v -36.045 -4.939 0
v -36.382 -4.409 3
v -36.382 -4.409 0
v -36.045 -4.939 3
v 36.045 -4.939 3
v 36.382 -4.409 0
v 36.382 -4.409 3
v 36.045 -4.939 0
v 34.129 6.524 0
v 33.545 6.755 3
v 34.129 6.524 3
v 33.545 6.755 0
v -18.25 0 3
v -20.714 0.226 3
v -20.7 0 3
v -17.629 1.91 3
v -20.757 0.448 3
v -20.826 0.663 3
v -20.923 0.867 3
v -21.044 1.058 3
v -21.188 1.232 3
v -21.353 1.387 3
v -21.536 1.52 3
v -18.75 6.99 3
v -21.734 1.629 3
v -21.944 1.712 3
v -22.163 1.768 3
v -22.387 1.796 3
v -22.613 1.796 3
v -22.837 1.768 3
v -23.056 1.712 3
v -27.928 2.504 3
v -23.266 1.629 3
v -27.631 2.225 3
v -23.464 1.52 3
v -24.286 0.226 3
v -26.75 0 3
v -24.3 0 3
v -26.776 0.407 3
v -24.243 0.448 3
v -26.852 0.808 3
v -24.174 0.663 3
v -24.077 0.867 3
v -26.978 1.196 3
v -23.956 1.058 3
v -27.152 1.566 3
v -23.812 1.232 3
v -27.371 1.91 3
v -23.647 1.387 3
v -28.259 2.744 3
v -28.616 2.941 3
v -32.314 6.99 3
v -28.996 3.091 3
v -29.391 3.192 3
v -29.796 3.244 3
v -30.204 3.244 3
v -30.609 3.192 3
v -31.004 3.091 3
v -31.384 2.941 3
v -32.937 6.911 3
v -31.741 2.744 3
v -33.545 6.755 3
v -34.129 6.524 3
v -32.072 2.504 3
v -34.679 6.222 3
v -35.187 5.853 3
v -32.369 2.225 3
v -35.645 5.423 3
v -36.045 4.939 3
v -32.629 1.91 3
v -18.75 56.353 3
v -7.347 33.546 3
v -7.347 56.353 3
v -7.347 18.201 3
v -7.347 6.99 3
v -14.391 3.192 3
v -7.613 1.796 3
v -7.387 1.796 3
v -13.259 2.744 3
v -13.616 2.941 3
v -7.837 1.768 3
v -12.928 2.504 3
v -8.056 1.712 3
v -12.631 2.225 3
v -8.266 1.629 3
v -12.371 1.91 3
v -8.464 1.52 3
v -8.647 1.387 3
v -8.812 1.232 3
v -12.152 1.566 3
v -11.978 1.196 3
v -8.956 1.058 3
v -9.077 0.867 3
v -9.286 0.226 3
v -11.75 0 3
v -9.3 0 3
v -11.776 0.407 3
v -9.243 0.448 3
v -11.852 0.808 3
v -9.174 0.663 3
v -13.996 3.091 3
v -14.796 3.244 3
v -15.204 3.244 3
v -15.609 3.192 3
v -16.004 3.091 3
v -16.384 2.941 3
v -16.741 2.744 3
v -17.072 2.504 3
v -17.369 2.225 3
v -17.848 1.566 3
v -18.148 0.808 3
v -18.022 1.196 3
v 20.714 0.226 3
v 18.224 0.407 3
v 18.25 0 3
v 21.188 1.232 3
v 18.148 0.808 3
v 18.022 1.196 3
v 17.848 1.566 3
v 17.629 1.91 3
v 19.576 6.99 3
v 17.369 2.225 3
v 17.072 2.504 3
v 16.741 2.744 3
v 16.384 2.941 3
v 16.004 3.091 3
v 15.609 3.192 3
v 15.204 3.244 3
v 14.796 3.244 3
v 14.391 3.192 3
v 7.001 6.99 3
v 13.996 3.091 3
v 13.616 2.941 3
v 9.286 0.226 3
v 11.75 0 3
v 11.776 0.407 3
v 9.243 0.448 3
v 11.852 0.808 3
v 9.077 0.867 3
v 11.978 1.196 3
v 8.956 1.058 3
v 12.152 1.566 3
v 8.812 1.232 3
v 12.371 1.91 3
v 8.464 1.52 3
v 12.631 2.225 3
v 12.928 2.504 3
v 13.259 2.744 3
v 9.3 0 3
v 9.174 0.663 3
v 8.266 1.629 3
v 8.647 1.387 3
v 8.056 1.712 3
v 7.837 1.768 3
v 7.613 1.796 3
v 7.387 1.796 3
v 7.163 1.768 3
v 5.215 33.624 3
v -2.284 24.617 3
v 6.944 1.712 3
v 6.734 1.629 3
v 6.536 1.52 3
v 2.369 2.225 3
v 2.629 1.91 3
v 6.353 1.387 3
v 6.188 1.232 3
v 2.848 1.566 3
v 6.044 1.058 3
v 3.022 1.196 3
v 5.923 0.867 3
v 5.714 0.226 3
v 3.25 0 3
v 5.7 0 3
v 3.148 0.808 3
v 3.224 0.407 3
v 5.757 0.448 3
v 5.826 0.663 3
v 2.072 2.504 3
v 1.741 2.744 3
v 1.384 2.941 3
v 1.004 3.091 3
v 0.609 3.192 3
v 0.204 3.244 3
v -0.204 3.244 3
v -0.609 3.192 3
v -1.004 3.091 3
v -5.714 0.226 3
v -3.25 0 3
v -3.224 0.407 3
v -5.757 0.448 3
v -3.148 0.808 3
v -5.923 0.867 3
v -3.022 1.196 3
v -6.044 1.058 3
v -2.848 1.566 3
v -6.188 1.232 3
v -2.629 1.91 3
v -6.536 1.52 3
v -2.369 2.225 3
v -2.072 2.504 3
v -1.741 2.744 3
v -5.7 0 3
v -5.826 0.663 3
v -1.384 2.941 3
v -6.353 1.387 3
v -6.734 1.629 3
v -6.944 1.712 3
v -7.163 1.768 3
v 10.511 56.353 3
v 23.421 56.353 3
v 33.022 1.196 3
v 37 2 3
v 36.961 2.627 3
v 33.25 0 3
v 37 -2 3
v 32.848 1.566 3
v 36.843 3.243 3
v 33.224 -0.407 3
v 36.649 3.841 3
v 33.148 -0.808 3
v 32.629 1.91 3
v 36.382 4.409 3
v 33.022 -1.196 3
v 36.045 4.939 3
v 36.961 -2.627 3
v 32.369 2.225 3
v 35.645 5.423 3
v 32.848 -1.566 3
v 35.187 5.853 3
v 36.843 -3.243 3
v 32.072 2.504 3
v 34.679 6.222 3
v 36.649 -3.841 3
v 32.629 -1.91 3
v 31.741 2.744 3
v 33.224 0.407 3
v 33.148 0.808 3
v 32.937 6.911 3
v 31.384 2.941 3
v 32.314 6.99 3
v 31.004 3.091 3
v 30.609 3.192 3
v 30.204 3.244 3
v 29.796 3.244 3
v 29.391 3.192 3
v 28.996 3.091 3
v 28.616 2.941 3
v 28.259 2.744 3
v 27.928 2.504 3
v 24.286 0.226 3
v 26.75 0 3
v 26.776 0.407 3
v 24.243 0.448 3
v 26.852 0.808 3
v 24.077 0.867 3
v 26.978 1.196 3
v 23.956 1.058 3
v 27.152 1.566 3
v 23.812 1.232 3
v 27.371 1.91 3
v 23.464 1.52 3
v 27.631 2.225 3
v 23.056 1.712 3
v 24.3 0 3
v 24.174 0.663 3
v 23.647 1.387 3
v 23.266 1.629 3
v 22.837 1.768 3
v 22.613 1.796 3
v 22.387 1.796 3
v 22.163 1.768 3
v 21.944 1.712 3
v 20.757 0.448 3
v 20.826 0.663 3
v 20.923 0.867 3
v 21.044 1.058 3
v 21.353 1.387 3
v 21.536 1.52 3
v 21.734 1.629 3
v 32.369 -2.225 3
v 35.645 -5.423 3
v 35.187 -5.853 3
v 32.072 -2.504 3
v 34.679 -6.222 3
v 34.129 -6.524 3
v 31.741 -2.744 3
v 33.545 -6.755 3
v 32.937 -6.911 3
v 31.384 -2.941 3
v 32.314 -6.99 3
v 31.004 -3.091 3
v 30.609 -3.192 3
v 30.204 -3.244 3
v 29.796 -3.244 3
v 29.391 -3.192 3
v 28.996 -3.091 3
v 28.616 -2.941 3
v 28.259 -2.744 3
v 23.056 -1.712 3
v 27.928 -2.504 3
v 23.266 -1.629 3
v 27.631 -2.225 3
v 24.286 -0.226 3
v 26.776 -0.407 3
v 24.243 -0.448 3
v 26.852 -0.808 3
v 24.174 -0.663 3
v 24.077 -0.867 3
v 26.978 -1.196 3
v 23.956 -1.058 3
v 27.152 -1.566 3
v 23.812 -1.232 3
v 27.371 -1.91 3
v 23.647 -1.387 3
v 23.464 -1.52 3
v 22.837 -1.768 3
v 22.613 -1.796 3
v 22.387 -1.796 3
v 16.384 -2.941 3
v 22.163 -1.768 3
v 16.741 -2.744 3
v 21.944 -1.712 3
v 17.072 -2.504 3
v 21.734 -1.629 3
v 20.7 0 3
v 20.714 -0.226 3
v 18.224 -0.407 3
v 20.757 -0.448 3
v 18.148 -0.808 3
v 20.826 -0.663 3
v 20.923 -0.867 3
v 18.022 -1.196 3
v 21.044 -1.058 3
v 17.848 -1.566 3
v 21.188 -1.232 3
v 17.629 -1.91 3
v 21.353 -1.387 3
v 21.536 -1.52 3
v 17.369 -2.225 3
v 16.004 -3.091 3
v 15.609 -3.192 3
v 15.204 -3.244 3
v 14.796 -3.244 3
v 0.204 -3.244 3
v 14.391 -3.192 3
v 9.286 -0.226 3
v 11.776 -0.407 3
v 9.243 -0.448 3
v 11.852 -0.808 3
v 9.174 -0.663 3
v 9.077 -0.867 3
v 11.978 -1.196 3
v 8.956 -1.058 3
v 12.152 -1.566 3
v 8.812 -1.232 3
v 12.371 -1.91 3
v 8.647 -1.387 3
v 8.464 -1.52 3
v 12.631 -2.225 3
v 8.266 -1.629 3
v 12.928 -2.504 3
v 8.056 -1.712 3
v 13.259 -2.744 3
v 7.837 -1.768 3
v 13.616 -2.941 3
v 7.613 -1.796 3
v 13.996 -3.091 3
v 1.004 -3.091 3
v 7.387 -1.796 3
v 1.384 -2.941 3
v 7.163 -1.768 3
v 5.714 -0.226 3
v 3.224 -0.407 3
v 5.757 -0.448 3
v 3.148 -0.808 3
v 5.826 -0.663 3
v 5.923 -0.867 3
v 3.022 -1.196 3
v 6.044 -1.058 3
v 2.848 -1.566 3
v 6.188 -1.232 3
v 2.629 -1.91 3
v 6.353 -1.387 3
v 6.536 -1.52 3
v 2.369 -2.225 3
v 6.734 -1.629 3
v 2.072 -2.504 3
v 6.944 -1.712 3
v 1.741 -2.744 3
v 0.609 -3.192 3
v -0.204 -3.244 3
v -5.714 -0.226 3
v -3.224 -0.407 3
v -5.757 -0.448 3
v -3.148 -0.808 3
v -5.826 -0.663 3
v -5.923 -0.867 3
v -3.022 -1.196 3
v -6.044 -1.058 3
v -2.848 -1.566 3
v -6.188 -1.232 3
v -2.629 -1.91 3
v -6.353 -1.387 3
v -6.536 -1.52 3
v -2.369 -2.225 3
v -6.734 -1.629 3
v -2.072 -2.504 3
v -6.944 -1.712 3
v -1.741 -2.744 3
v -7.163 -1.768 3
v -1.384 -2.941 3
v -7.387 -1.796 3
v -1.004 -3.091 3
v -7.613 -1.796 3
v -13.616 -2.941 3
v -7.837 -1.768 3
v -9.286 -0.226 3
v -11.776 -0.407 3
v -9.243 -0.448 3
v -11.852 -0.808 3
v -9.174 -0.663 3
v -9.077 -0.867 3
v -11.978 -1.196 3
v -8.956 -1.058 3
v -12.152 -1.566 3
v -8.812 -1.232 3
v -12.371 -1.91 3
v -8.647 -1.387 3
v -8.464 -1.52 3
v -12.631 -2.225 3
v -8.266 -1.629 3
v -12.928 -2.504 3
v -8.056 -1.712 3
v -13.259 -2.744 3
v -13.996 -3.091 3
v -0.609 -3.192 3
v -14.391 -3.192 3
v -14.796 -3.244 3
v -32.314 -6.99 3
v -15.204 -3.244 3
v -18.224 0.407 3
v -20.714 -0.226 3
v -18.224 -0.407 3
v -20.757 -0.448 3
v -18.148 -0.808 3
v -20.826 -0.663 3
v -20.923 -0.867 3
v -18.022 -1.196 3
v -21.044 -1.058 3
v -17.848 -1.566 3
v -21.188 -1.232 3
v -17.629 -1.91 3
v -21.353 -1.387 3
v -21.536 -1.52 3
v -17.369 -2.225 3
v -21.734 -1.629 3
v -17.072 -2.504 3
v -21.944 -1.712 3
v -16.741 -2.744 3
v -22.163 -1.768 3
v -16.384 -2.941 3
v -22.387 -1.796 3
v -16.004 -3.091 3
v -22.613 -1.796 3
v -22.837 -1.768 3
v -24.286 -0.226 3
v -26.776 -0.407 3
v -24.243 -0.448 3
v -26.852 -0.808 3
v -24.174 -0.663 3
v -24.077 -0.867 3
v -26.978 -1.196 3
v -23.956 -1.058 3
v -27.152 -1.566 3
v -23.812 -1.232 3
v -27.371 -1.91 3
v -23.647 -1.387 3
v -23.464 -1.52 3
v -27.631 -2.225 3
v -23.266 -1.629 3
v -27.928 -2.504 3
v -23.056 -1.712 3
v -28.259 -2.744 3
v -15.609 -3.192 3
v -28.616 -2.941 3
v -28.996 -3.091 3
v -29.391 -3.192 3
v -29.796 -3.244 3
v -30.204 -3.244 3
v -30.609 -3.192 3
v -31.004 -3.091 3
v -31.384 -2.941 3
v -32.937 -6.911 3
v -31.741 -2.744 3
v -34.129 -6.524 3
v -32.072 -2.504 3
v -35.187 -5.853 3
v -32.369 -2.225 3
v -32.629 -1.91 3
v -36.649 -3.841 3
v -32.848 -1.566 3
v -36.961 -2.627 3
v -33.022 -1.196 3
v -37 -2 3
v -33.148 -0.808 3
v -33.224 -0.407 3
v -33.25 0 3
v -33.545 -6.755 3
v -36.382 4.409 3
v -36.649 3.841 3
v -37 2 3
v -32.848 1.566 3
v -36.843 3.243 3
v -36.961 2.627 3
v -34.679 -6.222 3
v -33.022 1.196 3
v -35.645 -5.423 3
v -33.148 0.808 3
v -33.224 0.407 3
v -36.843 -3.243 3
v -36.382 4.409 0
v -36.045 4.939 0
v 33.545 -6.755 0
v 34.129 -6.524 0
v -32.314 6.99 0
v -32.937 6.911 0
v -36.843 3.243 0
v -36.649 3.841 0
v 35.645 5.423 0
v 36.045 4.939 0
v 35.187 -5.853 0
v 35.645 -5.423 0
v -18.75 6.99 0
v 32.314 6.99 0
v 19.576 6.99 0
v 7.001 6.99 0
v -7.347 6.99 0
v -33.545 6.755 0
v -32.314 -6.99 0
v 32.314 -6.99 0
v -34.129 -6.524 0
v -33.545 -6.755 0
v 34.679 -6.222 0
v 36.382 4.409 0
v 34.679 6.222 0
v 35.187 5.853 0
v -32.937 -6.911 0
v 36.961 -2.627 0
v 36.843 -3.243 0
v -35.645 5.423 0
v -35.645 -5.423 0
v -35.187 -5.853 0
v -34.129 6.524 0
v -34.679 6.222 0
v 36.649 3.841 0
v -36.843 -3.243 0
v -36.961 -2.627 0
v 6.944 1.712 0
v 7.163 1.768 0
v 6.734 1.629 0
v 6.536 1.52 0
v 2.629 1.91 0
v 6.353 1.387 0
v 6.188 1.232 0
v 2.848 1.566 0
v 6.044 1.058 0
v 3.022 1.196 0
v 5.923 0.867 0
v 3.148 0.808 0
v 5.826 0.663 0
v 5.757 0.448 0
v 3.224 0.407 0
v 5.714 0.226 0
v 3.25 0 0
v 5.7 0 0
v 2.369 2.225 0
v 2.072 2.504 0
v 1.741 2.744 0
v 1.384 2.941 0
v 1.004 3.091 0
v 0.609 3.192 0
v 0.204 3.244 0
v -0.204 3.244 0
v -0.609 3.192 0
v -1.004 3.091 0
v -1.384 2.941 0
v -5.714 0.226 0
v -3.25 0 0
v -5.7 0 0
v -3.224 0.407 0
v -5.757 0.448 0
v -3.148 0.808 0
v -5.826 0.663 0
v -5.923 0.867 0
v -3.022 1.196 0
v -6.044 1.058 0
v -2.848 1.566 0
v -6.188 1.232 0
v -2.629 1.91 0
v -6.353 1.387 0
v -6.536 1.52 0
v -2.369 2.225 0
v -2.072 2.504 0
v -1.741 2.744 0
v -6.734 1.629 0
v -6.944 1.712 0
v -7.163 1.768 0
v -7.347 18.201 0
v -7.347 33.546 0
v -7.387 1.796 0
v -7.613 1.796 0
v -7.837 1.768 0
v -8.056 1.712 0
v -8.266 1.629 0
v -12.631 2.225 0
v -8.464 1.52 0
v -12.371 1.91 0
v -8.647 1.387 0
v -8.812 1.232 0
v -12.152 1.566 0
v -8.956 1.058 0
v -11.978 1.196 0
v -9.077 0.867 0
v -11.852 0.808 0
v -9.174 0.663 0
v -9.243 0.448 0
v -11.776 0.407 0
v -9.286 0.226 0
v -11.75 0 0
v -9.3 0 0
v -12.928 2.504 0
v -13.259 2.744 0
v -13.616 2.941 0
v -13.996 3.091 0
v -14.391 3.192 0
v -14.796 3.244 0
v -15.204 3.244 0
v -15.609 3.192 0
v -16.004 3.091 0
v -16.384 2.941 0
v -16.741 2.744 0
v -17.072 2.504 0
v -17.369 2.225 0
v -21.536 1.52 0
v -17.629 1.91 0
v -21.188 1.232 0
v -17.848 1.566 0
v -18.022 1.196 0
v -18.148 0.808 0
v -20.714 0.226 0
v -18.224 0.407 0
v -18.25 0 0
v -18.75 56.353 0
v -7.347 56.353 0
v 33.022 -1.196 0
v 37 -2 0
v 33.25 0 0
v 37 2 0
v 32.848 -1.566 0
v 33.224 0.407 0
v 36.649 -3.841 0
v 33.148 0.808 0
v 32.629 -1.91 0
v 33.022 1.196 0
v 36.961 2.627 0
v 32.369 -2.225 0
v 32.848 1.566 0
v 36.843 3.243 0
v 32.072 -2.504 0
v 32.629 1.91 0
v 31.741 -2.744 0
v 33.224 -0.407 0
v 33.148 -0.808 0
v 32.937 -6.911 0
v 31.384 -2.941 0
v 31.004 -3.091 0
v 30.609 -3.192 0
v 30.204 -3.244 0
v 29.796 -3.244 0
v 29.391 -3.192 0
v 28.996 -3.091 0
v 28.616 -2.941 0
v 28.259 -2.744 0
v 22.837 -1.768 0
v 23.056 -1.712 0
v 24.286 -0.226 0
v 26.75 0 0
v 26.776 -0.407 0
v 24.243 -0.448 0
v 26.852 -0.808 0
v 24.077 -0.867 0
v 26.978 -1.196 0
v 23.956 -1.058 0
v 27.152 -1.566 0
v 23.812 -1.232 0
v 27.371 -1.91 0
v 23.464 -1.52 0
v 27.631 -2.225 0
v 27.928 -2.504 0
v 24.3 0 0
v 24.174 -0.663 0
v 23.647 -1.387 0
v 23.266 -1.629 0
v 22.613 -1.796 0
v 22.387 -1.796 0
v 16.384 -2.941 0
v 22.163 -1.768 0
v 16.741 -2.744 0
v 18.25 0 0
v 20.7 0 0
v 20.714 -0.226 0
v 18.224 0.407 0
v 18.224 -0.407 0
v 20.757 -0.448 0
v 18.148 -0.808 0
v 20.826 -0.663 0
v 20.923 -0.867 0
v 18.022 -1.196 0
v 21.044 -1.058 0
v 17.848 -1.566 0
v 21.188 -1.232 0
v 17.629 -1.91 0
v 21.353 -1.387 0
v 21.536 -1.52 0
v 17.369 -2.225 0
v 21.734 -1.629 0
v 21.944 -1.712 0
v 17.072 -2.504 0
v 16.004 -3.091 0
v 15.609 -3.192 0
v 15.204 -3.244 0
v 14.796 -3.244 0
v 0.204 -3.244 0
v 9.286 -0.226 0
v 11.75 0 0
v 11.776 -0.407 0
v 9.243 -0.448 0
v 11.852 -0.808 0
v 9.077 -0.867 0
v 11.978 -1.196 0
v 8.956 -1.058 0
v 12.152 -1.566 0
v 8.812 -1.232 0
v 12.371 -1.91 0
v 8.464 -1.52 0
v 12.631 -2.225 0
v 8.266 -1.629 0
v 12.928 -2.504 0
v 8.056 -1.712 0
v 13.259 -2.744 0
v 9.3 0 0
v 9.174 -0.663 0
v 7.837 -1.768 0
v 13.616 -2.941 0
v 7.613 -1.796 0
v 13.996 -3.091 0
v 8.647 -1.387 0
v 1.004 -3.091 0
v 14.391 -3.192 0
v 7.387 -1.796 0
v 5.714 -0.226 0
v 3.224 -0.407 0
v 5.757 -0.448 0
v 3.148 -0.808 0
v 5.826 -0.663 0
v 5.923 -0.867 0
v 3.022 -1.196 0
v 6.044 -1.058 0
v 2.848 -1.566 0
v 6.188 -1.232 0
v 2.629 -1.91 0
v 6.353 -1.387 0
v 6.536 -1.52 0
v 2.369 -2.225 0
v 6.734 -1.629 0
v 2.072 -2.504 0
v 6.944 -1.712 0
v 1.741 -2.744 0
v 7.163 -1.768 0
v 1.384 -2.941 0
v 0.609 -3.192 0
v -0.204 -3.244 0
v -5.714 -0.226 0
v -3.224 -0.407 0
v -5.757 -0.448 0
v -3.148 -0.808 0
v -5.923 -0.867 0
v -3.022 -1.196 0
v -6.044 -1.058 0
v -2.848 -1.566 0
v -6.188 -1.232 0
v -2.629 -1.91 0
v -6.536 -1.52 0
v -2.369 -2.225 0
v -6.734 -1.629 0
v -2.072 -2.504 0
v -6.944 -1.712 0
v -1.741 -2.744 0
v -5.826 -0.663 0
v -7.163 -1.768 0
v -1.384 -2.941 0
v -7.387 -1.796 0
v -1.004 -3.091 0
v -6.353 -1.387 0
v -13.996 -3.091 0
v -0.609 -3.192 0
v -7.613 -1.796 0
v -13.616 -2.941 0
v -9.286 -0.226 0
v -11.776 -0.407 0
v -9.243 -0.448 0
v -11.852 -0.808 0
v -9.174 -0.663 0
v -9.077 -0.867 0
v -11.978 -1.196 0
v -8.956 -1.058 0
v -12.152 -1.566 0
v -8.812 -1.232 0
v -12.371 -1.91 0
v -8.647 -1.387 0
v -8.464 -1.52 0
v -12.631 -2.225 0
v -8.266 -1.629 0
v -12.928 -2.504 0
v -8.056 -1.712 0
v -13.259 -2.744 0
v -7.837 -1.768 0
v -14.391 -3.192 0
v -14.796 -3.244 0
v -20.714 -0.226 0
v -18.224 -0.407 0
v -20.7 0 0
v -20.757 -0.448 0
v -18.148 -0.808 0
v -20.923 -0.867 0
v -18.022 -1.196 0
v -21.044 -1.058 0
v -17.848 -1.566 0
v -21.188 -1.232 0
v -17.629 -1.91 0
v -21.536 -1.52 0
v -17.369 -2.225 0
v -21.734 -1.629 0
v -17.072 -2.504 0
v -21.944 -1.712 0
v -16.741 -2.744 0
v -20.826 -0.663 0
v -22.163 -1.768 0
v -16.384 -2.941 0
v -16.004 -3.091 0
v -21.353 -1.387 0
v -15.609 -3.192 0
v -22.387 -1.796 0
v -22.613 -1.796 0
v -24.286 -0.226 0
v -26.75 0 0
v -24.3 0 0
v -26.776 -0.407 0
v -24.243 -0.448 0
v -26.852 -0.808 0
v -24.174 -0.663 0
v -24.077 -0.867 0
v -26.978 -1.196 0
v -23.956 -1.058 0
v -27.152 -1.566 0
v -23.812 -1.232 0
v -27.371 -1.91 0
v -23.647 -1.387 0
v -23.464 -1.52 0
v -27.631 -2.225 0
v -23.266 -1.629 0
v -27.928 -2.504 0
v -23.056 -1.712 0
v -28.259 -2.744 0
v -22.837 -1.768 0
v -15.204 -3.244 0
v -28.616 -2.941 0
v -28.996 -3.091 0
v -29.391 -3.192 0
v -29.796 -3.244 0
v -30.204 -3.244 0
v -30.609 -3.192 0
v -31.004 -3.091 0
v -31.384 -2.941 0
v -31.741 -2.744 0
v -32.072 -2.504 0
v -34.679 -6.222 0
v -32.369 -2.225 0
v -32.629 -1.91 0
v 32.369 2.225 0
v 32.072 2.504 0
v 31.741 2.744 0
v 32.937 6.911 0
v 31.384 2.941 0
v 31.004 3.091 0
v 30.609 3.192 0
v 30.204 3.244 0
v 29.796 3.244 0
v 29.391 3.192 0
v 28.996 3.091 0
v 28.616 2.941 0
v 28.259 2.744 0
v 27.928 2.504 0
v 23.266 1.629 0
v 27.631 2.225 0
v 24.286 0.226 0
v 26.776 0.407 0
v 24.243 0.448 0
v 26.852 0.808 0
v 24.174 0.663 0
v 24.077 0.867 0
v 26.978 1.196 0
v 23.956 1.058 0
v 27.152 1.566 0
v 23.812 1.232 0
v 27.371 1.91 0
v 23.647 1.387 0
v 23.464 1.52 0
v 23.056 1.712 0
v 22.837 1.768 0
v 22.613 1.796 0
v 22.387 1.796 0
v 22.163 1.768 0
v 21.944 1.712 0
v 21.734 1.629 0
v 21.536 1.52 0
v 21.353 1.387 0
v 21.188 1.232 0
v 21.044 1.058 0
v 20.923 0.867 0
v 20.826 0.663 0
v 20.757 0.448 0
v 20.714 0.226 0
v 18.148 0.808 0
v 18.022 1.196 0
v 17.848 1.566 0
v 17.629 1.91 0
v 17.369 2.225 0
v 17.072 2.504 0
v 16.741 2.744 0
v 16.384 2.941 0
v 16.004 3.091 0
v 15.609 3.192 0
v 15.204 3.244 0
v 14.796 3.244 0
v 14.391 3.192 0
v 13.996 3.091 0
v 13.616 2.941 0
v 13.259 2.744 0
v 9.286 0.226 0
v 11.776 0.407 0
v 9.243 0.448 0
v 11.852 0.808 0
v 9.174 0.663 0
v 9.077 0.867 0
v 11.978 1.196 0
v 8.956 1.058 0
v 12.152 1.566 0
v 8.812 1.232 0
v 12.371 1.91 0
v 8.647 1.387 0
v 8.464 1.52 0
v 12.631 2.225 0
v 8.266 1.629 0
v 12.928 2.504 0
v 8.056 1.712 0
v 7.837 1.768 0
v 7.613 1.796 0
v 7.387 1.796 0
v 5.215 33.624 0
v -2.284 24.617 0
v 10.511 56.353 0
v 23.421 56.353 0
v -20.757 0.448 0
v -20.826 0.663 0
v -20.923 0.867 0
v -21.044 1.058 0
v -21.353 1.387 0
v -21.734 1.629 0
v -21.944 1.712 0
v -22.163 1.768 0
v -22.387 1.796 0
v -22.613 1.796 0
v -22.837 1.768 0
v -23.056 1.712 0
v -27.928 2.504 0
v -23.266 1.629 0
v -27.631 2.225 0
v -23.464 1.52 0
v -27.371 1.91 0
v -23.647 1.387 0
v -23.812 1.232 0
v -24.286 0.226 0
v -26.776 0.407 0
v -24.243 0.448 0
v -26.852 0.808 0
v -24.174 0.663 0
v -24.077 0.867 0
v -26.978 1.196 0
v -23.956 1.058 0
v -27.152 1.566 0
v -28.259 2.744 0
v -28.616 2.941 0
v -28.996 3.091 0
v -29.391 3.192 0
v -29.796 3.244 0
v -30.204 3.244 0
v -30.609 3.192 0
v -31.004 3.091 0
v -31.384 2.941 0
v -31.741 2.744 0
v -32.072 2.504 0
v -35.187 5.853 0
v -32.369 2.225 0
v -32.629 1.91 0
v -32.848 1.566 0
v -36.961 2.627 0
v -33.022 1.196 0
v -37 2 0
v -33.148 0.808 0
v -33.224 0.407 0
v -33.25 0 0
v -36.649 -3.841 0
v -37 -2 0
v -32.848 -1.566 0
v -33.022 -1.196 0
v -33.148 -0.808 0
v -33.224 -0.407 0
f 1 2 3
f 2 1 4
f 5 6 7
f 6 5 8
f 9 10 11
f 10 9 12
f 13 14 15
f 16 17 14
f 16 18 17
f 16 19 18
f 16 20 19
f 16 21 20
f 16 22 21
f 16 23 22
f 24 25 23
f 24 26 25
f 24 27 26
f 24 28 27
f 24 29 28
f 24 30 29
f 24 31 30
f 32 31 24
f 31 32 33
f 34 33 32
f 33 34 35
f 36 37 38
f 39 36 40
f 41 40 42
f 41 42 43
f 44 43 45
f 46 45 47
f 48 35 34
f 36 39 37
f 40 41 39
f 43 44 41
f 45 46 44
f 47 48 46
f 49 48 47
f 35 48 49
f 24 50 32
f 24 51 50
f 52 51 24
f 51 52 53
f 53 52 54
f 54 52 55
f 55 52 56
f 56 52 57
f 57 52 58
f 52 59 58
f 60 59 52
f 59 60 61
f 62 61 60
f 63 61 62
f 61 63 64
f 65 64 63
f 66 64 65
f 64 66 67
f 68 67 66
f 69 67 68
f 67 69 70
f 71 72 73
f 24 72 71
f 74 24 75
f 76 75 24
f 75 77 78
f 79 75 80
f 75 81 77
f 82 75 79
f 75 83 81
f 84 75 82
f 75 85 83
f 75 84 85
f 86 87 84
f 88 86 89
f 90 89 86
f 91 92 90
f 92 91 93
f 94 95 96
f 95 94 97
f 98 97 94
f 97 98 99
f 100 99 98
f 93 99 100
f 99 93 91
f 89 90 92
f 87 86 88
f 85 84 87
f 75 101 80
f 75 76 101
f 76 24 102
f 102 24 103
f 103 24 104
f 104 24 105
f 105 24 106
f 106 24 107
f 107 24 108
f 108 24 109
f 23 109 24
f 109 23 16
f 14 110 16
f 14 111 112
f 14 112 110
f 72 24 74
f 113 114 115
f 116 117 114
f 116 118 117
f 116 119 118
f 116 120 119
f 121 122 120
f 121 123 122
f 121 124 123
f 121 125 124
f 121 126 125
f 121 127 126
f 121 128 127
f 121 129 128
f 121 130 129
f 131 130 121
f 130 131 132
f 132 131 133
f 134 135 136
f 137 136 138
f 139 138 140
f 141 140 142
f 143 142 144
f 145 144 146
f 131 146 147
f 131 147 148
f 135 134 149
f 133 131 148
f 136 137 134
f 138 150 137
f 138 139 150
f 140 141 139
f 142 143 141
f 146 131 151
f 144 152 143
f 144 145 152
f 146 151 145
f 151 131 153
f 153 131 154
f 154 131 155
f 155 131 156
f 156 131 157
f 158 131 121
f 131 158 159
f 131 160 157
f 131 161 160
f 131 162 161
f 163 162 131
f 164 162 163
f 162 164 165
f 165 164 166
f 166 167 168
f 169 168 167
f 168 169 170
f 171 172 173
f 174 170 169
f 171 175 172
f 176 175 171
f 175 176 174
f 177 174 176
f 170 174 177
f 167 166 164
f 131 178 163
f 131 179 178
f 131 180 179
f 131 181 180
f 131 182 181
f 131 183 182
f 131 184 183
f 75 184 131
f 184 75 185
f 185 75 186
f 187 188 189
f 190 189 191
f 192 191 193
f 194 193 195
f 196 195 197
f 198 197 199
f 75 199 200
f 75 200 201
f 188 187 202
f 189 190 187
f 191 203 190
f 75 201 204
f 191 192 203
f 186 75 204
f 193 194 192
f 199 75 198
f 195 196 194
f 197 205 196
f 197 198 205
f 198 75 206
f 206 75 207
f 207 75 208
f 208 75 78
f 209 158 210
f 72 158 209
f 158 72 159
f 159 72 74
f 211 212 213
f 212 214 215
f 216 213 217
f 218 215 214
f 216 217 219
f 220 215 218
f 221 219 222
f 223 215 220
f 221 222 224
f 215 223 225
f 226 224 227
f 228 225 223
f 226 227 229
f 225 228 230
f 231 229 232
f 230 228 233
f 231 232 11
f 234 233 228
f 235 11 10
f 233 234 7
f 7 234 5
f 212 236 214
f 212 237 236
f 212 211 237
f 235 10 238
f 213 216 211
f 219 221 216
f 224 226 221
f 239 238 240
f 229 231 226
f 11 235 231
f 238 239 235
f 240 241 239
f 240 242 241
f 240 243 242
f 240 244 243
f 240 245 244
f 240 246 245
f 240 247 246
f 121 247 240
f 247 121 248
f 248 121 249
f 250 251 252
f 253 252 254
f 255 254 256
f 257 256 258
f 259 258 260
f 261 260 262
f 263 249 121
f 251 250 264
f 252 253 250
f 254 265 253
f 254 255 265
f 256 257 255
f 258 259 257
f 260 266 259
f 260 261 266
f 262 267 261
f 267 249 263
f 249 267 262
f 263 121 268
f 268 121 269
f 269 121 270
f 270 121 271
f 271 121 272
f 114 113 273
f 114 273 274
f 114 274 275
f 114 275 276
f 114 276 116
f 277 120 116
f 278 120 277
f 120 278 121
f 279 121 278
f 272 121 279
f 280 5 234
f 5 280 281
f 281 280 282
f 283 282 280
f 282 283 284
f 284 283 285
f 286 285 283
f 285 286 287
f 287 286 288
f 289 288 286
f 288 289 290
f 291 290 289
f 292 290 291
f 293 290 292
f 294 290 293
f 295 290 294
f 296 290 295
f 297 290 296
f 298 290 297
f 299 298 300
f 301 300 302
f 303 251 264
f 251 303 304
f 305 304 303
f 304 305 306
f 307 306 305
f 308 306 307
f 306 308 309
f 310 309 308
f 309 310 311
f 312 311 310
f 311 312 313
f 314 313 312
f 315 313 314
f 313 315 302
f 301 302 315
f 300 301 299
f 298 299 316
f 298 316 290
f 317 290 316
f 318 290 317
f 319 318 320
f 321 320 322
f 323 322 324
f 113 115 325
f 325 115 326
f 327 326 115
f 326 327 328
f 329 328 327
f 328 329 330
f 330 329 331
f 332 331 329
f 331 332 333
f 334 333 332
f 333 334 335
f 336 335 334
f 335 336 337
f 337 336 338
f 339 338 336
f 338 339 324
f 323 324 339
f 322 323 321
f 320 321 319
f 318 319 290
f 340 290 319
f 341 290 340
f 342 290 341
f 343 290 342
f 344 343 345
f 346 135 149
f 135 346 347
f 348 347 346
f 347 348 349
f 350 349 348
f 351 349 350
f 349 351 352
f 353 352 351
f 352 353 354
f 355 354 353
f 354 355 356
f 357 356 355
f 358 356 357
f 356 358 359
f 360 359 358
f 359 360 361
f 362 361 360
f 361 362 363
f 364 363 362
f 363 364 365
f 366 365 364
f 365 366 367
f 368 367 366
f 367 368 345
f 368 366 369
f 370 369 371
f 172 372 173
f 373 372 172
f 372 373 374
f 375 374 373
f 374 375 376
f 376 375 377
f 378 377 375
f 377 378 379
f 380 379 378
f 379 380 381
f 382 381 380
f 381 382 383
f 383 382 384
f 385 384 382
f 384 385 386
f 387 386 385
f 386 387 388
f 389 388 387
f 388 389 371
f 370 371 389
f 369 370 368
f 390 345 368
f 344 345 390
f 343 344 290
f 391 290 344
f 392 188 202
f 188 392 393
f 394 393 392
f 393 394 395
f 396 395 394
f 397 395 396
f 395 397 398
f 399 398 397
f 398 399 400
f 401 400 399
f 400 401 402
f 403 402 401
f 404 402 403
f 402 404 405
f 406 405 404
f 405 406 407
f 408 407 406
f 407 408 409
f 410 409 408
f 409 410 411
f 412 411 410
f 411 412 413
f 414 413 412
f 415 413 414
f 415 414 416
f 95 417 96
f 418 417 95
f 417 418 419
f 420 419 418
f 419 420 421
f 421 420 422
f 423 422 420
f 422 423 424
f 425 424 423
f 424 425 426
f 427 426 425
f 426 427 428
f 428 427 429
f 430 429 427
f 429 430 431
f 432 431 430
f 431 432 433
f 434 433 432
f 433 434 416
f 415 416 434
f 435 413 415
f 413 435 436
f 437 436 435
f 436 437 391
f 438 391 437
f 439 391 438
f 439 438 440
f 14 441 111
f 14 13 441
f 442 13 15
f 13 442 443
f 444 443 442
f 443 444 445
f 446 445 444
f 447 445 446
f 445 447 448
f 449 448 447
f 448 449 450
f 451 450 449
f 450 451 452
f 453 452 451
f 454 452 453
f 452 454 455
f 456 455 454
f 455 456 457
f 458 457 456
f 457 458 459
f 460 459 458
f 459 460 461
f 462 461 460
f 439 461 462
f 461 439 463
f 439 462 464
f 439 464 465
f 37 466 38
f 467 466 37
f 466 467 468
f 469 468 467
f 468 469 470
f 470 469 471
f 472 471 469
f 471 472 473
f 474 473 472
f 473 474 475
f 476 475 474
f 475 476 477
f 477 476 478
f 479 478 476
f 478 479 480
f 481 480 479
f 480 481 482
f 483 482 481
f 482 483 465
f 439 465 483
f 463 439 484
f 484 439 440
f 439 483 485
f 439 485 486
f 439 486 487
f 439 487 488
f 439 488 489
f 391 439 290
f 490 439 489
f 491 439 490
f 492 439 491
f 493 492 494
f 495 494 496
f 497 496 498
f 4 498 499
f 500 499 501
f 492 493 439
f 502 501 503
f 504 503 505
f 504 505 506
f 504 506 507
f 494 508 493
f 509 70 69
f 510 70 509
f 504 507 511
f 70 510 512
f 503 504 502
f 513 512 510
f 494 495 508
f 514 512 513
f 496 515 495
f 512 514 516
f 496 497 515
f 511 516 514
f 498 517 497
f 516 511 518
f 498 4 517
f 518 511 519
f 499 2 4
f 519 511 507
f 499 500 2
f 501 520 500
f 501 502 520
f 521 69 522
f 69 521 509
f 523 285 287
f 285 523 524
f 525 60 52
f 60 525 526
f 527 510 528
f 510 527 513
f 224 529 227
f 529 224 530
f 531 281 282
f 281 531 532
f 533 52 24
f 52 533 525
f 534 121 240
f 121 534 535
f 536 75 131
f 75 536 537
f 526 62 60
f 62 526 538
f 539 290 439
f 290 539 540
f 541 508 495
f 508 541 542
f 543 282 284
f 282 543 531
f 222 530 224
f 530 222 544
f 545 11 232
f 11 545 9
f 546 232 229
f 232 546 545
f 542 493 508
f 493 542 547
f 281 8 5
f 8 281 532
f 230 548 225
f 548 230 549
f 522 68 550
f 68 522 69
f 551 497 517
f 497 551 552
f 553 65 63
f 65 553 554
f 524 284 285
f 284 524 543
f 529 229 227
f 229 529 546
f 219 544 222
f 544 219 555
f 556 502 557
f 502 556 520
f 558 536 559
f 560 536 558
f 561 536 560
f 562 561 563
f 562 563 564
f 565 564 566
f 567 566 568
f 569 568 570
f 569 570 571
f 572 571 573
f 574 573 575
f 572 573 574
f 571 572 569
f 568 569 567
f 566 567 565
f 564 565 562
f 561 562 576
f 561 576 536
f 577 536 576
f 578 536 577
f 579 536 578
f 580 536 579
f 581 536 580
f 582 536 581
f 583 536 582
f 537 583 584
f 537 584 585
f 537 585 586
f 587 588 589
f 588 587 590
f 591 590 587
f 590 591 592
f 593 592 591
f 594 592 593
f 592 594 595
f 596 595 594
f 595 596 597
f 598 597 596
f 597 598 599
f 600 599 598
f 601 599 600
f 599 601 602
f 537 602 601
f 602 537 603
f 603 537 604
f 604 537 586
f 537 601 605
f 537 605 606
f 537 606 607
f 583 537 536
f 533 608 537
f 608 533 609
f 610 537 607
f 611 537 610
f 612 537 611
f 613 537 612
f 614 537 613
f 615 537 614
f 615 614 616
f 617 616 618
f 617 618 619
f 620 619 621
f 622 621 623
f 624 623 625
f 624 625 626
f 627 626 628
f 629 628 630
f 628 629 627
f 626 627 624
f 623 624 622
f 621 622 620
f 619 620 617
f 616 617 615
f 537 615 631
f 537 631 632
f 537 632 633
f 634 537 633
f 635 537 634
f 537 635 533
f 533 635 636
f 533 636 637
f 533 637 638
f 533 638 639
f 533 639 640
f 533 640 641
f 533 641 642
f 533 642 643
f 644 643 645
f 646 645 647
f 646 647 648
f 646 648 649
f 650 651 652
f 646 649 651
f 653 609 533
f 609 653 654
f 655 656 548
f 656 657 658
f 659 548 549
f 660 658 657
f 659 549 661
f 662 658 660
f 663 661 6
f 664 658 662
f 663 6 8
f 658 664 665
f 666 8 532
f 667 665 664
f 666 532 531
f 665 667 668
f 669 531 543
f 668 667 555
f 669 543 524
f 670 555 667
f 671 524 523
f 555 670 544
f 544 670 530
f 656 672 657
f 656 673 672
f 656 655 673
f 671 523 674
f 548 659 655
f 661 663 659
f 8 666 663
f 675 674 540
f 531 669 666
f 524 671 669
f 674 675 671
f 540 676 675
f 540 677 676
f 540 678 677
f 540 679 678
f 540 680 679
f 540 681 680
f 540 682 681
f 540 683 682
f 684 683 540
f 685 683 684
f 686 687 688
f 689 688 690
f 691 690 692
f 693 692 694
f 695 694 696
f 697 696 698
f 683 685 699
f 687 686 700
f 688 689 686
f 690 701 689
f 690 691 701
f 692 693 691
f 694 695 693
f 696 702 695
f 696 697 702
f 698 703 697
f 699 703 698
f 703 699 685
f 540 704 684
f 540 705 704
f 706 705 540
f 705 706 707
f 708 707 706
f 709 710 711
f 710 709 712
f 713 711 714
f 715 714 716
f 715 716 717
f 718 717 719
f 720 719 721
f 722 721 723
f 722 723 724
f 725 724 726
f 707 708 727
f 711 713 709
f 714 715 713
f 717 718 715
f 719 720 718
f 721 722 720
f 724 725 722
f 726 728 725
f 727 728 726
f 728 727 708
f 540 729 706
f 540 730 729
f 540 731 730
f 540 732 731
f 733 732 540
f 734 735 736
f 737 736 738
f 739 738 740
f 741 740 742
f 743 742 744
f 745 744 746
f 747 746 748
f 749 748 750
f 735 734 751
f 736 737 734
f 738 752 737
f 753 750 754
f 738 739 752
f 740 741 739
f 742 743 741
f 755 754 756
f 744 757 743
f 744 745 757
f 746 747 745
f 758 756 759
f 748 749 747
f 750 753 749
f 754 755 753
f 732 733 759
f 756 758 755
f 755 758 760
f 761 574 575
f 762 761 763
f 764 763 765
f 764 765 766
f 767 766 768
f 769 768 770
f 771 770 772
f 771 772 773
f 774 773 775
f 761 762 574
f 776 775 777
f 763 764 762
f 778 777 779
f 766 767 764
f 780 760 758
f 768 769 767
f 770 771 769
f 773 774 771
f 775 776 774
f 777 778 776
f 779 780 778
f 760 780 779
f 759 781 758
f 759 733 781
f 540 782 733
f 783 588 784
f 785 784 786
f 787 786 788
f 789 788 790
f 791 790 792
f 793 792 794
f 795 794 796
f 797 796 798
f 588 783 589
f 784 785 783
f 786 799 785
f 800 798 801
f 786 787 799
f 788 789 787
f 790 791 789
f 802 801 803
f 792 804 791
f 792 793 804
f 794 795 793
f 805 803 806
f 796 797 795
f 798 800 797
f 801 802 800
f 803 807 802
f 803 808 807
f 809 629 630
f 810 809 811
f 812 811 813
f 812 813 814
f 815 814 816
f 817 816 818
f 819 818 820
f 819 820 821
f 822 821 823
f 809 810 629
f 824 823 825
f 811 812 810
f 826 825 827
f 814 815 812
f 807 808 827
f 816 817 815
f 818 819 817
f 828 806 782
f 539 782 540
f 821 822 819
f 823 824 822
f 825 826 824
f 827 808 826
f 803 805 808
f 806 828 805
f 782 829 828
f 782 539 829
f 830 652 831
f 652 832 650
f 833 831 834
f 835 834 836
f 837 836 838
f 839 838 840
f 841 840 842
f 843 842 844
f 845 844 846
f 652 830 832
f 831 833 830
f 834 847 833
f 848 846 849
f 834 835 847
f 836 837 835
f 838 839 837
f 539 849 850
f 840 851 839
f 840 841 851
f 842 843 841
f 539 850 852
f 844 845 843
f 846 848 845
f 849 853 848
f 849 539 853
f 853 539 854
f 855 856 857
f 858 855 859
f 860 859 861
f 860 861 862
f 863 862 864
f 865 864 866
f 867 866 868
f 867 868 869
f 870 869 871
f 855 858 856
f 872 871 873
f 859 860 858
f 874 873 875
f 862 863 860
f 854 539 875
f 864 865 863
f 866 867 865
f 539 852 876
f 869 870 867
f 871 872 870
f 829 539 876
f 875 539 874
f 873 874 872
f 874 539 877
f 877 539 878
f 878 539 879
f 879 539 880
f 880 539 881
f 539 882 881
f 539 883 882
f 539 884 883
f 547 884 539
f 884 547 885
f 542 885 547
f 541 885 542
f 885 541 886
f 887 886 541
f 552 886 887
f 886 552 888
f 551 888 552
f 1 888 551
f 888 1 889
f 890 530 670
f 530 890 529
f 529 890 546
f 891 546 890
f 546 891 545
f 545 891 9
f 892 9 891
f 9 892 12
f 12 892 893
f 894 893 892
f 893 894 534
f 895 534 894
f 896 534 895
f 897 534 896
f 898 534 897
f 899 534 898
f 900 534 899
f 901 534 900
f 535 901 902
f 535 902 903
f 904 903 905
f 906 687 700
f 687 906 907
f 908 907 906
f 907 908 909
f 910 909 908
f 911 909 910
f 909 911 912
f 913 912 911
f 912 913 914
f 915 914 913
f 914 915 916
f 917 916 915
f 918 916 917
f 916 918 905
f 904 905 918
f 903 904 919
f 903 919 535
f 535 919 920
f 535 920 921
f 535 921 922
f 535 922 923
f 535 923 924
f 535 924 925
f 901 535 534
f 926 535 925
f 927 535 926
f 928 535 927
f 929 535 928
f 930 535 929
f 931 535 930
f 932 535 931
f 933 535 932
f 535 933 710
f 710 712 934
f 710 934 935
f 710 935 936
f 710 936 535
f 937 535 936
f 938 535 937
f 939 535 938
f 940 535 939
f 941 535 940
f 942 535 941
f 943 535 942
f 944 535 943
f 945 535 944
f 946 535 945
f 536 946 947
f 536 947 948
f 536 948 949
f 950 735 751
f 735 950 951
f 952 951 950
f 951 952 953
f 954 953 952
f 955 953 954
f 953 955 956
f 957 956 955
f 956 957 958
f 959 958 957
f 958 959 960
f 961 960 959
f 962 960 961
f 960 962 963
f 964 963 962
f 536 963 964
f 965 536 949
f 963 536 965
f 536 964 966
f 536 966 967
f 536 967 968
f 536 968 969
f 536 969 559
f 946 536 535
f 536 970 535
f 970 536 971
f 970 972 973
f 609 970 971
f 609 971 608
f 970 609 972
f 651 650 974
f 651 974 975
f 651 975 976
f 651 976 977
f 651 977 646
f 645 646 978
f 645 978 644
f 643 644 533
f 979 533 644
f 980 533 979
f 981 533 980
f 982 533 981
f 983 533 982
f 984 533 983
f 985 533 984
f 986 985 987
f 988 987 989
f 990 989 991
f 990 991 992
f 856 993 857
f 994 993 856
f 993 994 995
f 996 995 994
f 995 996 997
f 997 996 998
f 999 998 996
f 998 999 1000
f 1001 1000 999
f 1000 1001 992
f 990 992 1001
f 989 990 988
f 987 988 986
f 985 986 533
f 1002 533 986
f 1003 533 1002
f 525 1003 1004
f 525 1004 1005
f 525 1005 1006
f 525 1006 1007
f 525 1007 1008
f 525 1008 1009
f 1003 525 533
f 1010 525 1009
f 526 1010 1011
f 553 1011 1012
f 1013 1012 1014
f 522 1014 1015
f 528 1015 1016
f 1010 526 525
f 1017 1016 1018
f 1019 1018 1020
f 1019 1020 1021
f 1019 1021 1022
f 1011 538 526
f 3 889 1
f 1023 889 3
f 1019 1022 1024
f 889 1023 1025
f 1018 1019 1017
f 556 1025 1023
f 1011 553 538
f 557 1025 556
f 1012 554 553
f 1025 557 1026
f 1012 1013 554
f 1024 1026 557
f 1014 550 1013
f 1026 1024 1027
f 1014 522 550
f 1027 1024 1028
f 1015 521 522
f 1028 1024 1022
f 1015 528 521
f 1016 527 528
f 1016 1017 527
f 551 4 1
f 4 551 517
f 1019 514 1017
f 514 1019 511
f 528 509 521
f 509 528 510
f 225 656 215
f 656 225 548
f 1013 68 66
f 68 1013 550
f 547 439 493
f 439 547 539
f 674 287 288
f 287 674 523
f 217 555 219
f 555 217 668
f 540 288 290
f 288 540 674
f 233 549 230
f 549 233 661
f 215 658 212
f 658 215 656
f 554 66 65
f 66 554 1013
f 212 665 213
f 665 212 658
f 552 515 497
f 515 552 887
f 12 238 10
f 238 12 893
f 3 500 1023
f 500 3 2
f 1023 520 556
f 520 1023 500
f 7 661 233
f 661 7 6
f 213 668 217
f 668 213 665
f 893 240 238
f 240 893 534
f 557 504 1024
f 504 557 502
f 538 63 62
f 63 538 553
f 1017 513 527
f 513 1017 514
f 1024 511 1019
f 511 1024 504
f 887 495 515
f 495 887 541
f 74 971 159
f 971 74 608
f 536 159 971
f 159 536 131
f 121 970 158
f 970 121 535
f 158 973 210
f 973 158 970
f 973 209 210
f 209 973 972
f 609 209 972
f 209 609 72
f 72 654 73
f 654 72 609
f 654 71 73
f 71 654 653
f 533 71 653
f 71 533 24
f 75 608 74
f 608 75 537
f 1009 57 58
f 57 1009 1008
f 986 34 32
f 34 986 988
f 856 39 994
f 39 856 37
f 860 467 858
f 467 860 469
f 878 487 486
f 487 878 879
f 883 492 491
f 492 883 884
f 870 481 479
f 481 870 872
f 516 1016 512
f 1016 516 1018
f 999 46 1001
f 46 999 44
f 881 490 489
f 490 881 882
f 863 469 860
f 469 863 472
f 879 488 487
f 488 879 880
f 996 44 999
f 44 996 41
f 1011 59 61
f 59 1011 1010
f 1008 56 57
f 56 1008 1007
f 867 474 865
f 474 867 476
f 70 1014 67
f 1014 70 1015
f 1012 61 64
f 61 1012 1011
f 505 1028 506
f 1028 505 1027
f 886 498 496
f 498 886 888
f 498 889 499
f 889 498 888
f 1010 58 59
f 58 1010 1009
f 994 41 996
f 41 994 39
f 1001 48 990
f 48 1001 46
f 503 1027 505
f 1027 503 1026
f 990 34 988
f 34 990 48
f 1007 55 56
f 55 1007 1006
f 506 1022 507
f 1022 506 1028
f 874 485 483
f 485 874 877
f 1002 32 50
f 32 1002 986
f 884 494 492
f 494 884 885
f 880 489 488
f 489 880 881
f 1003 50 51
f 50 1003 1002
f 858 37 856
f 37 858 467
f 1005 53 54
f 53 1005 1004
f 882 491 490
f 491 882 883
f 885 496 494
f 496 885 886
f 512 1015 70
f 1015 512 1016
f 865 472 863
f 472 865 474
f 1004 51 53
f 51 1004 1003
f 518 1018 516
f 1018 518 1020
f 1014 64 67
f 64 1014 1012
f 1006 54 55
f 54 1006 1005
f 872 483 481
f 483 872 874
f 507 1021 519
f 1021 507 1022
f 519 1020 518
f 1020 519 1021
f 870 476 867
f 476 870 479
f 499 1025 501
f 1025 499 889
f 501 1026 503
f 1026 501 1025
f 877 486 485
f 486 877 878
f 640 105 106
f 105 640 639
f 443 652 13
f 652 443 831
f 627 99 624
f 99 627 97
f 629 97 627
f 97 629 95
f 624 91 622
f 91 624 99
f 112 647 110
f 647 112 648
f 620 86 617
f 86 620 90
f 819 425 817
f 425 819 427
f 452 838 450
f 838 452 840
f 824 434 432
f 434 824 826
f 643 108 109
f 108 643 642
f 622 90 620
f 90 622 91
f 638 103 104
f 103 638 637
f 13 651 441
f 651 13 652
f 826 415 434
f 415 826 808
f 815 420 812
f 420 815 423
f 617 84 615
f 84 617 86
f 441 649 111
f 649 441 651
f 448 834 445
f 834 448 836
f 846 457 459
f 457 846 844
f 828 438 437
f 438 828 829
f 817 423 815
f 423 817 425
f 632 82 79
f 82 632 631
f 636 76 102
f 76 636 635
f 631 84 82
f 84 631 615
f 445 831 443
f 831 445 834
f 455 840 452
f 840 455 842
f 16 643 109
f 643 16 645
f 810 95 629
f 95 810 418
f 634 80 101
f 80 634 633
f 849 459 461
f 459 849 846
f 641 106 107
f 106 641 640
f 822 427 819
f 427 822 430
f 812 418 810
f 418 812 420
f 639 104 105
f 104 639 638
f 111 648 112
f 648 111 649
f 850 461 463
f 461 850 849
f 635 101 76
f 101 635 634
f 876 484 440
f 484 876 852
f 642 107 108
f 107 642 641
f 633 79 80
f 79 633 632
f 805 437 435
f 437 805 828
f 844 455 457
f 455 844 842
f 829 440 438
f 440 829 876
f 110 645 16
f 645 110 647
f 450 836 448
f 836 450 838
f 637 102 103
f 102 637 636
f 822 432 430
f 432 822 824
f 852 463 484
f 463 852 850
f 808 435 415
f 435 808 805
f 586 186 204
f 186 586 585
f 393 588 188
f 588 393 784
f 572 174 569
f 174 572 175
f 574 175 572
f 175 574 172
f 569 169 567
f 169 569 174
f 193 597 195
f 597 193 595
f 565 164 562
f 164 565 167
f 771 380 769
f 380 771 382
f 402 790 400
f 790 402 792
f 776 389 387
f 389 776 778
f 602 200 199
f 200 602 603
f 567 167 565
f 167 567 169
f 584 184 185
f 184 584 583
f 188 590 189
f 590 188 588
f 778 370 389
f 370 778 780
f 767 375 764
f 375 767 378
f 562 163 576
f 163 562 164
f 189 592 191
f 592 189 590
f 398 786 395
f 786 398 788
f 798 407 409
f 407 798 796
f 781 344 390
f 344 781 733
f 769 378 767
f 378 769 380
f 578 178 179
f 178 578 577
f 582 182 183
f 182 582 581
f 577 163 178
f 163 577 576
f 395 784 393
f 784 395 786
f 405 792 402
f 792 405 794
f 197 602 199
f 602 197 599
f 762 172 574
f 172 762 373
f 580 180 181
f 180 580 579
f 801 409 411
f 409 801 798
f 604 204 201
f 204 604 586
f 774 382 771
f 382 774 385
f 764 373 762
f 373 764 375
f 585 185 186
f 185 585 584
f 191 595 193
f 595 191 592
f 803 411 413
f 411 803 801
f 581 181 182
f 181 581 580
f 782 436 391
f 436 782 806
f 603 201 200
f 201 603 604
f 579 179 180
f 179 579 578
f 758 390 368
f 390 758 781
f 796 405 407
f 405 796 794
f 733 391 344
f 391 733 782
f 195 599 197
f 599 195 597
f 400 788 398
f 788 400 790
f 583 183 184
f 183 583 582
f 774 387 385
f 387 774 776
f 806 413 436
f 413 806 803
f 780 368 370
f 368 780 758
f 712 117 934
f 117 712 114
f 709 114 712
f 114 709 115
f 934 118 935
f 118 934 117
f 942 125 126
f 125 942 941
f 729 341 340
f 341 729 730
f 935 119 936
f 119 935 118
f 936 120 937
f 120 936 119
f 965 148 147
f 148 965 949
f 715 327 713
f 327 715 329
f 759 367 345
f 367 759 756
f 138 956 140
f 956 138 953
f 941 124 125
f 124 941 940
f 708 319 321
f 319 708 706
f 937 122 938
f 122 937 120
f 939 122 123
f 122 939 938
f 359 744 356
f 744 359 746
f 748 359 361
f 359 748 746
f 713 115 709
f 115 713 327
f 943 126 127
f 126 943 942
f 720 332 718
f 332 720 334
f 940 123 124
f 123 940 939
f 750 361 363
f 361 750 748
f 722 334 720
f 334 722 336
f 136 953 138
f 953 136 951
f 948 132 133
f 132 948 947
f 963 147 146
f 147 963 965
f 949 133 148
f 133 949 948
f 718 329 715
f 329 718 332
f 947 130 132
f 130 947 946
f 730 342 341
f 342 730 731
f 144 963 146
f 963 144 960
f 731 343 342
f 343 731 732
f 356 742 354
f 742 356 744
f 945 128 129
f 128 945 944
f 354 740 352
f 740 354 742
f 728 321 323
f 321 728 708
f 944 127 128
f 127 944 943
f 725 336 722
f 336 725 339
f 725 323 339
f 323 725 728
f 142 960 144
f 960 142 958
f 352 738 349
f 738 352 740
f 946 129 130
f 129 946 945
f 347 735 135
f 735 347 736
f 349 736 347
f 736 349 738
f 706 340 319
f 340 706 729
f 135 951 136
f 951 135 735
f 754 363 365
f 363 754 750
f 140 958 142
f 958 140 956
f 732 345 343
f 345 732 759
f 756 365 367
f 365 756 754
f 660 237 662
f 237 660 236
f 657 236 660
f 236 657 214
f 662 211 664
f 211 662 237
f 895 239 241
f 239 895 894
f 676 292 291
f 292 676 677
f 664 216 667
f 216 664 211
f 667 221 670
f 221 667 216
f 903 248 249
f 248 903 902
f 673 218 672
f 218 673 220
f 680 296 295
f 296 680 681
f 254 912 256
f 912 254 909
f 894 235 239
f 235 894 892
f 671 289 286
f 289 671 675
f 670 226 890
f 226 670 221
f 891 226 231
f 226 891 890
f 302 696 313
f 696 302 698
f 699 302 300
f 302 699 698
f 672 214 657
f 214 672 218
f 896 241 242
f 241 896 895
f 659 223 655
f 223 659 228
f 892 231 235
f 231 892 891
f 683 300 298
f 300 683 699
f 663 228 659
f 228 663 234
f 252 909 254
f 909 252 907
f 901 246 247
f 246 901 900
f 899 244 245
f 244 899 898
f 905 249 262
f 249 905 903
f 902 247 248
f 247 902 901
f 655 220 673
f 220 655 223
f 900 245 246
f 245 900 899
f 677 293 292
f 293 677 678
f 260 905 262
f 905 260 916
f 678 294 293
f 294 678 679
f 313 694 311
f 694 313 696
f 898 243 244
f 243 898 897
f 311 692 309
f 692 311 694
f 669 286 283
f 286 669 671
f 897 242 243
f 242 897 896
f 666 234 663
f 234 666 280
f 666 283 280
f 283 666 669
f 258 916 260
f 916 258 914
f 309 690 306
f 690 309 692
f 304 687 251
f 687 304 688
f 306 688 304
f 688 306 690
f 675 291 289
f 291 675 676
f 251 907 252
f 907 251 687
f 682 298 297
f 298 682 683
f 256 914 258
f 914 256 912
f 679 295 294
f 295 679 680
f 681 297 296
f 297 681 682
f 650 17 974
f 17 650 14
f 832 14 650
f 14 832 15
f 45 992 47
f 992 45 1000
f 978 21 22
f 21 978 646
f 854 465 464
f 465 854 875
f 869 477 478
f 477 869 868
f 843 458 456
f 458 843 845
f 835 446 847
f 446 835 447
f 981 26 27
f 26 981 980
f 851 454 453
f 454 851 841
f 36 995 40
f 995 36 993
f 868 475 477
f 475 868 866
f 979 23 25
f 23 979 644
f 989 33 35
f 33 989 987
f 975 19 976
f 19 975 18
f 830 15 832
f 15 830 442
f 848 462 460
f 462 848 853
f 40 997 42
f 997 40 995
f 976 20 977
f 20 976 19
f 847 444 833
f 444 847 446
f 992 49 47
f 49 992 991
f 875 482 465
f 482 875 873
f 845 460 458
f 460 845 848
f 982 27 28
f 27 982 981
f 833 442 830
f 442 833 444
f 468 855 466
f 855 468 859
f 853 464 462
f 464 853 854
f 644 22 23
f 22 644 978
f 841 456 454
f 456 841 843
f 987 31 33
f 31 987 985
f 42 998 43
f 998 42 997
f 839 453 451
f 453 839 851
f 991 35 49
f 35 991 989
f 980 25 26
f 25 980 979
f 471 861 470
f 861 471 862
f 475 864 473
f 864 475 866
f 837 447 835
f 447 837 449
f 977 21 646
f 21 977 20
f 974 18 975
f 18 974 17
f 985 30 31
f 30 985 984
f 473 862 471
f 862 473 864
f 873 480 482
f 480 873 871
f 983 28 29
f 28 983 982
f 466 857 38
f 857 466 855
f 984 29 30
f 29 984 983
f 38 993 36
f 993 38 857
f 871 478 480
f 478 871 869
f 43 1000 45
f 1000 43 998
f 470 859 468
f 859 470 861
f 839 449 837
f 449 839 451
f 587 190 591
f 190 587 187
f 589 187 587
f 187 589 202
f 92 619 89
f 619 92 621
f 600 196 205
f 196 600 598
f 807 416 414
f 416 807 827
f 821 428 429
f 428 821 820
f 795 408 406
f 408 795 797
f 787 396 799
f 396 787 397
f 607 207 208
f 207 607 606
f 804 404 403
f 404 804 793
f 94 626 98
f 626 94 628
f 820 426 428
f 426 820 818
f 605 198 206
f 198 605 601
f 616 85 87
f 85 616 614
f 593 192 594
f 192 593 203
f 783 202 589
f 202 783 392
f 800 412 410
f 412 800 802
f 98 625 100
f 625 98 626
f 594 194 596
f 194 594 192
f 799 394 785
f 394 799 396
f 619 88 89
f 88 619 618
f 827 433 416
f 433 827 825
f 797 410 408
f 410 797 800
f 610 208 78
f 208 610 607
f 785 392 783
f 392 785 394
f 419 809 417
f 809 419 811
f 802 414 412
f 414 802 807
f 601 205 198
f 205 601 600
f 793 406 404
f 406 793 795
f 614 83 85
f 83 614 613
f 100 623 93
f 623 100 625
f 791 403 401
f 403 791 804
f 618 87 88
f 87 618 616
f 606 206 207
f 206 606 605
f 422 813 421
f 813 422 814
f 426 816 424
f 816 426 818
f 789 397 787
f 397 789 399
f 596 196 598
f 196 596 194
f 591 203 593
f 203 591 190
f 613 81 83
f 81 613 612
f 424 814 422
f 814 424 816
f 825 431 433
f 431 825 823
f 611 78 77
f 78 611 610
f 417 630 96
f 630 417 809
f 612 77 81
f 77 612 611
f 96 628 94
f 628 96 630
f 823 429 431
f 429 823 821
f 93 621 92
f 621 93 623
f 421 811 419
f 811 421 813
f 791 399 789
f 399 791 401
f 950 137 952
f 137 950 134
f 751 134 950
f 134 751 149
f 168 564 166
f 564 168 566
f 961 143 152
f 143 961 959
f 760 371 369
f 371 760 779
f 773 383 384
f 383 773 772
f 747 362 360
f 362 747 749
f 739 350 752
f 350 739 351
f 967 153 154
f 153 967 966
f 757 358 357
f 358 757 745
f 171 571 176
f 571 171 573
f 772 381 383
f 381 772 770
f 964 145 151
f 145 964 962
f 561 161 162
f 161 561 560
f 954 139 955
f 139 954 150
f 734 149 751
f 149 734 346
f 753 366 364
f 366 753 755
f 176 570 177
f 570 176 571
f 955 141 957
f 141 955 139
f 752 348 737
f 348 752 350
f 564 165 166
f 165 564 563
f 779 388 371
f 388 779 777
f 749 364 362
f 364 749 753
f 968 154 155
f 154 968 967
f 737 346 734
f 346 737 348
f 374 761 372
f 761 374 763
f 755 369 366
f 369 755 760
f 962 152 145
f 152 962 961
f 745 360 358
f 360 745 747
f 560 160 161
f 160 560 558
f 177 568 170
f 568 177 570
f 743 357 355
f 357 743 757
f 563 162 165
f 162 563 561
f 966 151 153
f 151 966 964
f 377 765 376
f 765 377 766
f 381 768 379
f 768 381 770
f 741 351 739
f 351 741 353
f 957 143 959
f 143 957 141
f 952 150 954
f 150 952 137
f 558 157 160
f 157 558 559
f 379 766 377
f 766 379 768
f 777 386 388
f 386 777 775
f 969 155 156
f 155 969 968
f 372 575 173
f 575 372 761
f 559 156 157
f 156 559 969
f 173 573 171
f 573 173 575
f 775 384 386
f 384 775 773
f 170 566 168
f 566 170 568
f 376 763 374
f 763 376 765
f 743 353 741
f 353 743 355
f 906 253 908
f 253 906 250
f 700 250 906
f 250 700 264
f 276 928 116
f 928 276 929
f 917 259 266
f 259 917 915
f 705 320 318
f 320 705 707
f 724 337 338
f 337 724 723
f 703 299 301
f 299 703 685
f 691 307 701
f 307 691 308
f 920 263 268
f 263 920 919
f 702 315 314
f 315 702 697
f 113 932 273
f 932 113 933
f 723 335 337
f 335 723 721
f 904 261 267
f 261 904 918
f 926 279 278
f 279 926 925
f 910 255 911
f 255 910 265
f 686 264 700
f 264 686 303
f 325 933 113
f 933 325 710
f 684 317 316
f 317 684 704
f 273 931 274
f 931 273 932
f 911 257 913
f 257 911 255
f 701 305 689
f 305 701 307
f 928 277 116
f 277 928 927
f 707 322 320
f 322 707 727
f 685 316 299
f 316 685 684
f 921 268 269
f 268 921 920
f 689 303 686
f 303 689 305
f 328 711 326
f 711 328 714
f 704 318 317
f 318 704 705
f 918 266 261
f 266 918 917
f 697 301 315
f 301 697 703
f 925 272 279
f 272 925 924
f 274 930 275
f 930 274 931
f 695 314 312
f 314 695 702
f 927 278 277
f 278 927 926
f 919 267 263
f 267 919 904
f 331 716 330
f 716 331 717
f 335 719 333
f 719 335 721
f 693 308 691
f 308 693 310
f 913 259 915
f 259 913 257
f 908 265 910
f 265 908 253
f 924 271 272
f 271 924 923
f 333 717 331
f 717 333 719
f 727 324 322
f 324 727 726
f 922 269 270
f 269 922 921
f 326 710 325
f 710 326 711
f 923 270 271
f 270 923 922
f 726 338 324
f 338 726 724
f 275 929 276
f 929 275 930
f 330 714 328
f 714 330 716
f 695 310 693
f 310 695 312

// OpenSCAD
$fn = 50;


difference() {
	union() {
		hull() {
			translate(v = [-32.0000000000, 2.0000000000, 0]) {
				cylinder(h = 3, r = 5);
			}
			translate(v = [32.0000000000, 2.0000000000, 0]) {
				cylinder(h = 3, r = 5);
			}
			translate(v = [-32.0000000000, -2.0000000000, 0]) {
				cylinder(h = 3, r = 5);
			}
			translate(v = [32.0000000000, -2.0000000000, 0]) {
				cylinder(h = 3, r = 5);
			}
		}
		translate(v = [0, 55, 0]) {
			linear_extrude(height = 3) {
				text(font = "DejaVu Sans Mono:style=Bold", halign = "center", size = 57.0000000000, text = "K", valign = "top");
			}
		}
	}
	union() {
		translate(v = [-30.0000000000, 0.0000000000, 0]) {
			translate(v = [0, 0, -100]) {
				cylinder(h = 200, r = 3.2500000000);
			}
		}
		translate(v = [-15.0000000000, 0.0000000000, 0]) {
			translate(v = [0, 0, -100]) {
				cylinder(h = 200, r = 3.2500000000);
			}
		}
		translate(v = [0, 0, -100]) {
			cylinder(h = 200, r = 3.2500000000);
		}
		translate(v = [15.0000000000, 0.0000000000, 0]) {
			translate(v = [0, 0, -100]) {
				cylinder(h = 200, r = 3.2500000000);
			}
		}
		translate(v = [30.0000000000, 0.0000000000, 0]) {
			translate(v = [0, 0, -100]) {
				cylinder(h = 200, r = 3.2500000000);
			}
		}
		translate(v = [-30.0000000000, 0.0000000000, 0]) {
			translate(v = [0, 0, -100]) {
				cylinder(h = 200, r = 1.8000000000);
			}
		}
		translate(v = [-22.5000000000, 0.0000000000, 0]) {
			translate(v = [0, 0, -100]) {
				cylinder(h = 200, r = 1.8000000000);
			}
		}
		translate(v = [-15.0000000000, 0.0000000000, 0]) {
			translate(v = [0, 0, -100]) {
				cylinder(h = 200, r = 1.8000000000);
			}
		}
		translate(v = [-7.5000000000, 0.0000000000, 0]) {
			translate(v = [0, 0, -100]) {
				cylinder(h = 200, r = 1.8000000000);
			}
		}
		translate(v = [0, 0, -100]) {
			cylinder(h = 200, r = 1.8000000000);
		}
		translate(v = [7.5000000000, 0.0000000000, 0]) {
			translate(v = [0, 0, -100]) {
				cylinder(h = 200, r = 1.8000000000);
			}
		}
		translate(v = [15.0000000000, 0.0000000000, 0]) {
			translate(v = [0, 0, -100]) {
				cylinder(h = 200, r = 1.8000000000);
			}
		}
		translate(v = [22.5000000000, 0.0000000000, 0]) {
			translate(v = [0, 0, -100]) {
				cylinder(h = 200, r = 1.8000000000);
			}
		}
		translate(v = [30.0000000000, 0.0000000000, 0]) {
			translate(v = [0, 0, -100]) {
				cylinder(h = 200, r = 1.8000000000);
			}
		}
	}
}
